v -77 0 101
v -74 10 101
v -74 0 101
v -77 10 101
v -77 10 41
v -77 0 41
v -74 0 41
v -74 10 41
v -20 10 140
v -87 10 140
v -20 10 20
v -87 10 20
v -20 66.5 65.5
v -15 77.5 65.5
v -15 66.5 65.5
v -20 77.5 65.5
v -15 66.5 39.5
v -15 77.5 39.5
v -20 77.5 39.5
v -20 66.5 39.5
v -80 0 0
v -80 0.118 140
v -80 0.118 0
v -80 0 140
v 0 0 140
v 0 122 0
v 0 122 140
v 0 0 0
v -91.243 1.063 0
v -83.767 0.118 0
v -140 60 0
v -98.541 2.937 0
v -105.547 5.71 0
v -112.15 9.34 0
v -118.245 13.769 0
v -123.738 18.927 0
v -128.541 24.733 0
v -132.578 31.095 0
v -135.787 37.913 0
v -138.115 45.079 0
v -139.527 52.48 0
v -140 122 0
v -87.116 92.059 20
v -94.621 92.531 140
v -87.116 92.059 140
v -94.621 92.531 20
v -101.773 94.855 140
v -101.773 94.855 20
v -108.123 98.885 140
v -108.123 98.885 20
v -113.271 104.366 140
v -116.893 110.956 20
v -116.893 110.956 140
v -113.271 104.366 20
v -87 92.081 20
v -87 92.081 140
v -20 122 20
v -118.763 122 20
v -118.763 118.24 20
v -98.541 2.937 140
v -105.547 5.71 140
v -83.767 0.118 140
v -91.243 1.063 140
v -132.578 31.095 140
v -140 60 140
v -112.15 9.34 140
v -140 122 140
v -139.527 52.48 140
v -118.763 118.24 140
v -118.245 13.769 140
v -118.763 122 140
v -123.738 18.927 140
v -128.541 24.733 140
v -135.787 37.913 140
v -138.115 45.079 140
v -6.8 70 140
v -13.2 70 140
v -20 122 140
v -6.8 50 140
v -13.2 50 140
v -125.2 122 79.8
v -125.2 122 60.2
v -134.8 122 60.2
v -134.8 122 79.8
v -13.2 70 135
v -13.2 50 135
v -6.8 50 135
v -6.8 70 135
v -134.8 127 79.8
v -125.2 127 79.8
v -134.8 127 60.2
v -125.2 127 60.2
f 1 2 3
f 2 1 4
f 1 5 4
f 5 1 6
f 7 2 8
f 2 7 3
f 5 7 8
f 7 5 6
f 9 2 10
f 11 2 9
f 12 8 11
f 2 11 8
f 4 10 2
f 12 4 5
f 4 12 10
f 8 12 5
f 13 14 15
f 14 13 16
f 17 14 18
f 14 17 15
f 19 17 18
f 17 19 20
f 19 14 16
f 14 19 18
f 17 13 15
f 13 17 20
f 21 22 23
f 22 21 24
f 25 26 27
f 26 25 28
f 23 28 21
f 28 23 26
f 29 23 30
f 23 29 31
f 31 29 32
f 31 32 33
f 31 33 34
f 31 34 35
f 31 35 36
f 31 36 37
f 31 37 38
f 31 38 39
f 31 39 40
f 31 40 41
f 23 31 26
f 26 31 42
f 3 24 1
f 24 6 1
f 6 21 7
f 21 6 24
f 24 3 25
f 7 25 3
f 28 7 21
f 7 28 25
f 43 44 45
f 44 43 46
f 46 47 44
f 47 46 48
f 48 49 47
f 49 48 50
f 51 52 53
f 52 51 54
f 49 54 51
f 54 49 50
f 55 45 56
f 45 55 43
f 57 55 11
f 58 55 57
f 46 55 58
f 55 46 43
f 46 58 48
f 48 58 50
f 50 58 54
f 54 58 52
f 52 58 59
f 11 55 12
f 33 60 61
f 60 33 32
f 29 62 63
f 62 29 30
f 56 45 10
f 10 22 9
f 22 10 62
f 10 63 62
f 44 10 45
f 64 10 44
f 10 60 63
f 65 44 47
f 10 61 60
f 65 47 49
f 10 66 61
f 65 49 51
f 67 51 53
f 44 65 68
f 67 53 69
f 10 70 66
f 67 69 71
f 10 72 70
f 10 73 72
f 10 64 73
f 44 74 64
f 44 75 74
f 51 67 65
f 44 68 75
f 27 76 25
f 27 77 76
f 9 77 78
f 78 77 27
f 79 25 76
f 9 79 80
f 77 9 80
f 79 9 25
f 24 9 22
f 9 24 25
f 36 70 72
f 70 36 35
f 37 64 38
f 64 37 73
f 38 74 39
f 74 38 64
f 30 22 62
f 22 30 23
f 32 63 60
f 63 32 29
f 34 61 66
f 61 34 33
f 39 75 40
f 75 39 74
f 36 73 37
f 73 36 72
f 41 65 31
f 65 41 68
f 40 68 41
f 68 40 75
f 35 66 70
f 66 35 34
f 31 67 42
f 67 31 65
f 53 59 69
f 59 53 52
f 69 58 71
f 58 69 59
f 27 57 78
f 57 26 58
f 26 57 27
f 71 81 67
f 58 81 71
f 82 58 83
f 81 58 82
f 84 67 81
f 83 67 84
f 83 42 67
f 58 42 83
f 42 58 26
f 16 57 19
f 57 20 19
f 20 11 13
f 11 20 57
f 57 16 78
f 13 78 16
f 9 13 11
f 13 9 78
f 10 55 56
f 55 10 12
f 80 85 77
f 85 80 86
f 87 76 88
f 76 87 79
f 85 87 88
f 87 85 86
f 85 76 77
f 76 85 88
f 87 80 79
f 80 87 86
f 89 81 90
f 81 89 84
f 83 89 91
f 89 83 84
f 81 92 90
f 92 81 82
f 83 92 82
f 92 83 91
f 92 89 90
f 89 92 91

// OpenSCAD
rotate(a=90,v=[0,-1,0]) {
difference() {
    union() {
        difference() {
            cube([235,290,80]); // bottom
            
            union() {
                translate([168,20,78])
                cube([53,74,3]);    // nfc
                translate([180,94,78])
                cube([29,35,3]);    // nfc module
                translate([187,122,78])
                cube([14,20,3]);    // nfc line
                
                translate([41,-1,74])
                cube([60,11,3]);    // printer
                
                translate([39.5,66.5,15])
                cube([26,11,24]);
            }
        }
        
        difference() {
            translate([0,60,80])
            rotate(a=90,v=[0,1,0]) {
                cylinder(r=60,h=140,$fn=50); // front
            }
            union() {
                translate([41,-1,74])
                cube([60,11,3]);    // printer
                
                translate([20,122,89])
                rotate(a=90,v=[0,1,0]) {
                    cylinder(r=30,h=140,$fn=25);
                }
            }
        }
        
        difference() {
            translate([0,60,80])
            cube([140,65,60]);  // front2
            
             translate([20,122,89])
             rotate(a=90,v=[0,1,0]) {
                 cylinder(r=30,h=140,$fn=25);
             }
        }
        
        difference() {
            translate([0,122,80])
            cube([235,168,60]); // back
            
            union() {
                translate([187,122,79])
                cube([14,20,6]);    // nfc line
                
                translate([21,140,138])
                cube([193,112,3]);  // lcd
                translate([35,144,134])
                cube([167,101,5]);  // lcd bottom
                translate([91,172,120])
                cube([65,56,15]);   // lcd module
                translate([97,140,130])
                cube([40,32,10]);    // lcd line
                
                translate([45,266,120])
                cube([145,10,21]);  // back lid
            }
        }
    }
    
    union() {
        translate([20,10,20])
        cube([195,260,40]); // inside bottom
        
        translate([20,10,60])
        cube([113,130,27]); // inside printer
        translate([20,140,60])
        cube([195,130,61]); // inside lcd
        
        translate([45,266,20])
        cube([145,25,101]); // inside back lid
        translate([45,266,10])
        cube([145,10,11]);  // inside bottom lid
        
        translate([140,-1,-1])
        cube([96,292,142]);
        translate([-1,122,-1])
        cube([141,169,142]);
        
        translate([132,10,60])
        cube([9,131,27]);   // 133+7,10+130,60+27
        
        translate([135,50,6.8])
        cube([6,20,6.4]);    // in
    }
}

translate([60.2,121,125.2])
cube([19.6,6,9.6]);     // on
}
